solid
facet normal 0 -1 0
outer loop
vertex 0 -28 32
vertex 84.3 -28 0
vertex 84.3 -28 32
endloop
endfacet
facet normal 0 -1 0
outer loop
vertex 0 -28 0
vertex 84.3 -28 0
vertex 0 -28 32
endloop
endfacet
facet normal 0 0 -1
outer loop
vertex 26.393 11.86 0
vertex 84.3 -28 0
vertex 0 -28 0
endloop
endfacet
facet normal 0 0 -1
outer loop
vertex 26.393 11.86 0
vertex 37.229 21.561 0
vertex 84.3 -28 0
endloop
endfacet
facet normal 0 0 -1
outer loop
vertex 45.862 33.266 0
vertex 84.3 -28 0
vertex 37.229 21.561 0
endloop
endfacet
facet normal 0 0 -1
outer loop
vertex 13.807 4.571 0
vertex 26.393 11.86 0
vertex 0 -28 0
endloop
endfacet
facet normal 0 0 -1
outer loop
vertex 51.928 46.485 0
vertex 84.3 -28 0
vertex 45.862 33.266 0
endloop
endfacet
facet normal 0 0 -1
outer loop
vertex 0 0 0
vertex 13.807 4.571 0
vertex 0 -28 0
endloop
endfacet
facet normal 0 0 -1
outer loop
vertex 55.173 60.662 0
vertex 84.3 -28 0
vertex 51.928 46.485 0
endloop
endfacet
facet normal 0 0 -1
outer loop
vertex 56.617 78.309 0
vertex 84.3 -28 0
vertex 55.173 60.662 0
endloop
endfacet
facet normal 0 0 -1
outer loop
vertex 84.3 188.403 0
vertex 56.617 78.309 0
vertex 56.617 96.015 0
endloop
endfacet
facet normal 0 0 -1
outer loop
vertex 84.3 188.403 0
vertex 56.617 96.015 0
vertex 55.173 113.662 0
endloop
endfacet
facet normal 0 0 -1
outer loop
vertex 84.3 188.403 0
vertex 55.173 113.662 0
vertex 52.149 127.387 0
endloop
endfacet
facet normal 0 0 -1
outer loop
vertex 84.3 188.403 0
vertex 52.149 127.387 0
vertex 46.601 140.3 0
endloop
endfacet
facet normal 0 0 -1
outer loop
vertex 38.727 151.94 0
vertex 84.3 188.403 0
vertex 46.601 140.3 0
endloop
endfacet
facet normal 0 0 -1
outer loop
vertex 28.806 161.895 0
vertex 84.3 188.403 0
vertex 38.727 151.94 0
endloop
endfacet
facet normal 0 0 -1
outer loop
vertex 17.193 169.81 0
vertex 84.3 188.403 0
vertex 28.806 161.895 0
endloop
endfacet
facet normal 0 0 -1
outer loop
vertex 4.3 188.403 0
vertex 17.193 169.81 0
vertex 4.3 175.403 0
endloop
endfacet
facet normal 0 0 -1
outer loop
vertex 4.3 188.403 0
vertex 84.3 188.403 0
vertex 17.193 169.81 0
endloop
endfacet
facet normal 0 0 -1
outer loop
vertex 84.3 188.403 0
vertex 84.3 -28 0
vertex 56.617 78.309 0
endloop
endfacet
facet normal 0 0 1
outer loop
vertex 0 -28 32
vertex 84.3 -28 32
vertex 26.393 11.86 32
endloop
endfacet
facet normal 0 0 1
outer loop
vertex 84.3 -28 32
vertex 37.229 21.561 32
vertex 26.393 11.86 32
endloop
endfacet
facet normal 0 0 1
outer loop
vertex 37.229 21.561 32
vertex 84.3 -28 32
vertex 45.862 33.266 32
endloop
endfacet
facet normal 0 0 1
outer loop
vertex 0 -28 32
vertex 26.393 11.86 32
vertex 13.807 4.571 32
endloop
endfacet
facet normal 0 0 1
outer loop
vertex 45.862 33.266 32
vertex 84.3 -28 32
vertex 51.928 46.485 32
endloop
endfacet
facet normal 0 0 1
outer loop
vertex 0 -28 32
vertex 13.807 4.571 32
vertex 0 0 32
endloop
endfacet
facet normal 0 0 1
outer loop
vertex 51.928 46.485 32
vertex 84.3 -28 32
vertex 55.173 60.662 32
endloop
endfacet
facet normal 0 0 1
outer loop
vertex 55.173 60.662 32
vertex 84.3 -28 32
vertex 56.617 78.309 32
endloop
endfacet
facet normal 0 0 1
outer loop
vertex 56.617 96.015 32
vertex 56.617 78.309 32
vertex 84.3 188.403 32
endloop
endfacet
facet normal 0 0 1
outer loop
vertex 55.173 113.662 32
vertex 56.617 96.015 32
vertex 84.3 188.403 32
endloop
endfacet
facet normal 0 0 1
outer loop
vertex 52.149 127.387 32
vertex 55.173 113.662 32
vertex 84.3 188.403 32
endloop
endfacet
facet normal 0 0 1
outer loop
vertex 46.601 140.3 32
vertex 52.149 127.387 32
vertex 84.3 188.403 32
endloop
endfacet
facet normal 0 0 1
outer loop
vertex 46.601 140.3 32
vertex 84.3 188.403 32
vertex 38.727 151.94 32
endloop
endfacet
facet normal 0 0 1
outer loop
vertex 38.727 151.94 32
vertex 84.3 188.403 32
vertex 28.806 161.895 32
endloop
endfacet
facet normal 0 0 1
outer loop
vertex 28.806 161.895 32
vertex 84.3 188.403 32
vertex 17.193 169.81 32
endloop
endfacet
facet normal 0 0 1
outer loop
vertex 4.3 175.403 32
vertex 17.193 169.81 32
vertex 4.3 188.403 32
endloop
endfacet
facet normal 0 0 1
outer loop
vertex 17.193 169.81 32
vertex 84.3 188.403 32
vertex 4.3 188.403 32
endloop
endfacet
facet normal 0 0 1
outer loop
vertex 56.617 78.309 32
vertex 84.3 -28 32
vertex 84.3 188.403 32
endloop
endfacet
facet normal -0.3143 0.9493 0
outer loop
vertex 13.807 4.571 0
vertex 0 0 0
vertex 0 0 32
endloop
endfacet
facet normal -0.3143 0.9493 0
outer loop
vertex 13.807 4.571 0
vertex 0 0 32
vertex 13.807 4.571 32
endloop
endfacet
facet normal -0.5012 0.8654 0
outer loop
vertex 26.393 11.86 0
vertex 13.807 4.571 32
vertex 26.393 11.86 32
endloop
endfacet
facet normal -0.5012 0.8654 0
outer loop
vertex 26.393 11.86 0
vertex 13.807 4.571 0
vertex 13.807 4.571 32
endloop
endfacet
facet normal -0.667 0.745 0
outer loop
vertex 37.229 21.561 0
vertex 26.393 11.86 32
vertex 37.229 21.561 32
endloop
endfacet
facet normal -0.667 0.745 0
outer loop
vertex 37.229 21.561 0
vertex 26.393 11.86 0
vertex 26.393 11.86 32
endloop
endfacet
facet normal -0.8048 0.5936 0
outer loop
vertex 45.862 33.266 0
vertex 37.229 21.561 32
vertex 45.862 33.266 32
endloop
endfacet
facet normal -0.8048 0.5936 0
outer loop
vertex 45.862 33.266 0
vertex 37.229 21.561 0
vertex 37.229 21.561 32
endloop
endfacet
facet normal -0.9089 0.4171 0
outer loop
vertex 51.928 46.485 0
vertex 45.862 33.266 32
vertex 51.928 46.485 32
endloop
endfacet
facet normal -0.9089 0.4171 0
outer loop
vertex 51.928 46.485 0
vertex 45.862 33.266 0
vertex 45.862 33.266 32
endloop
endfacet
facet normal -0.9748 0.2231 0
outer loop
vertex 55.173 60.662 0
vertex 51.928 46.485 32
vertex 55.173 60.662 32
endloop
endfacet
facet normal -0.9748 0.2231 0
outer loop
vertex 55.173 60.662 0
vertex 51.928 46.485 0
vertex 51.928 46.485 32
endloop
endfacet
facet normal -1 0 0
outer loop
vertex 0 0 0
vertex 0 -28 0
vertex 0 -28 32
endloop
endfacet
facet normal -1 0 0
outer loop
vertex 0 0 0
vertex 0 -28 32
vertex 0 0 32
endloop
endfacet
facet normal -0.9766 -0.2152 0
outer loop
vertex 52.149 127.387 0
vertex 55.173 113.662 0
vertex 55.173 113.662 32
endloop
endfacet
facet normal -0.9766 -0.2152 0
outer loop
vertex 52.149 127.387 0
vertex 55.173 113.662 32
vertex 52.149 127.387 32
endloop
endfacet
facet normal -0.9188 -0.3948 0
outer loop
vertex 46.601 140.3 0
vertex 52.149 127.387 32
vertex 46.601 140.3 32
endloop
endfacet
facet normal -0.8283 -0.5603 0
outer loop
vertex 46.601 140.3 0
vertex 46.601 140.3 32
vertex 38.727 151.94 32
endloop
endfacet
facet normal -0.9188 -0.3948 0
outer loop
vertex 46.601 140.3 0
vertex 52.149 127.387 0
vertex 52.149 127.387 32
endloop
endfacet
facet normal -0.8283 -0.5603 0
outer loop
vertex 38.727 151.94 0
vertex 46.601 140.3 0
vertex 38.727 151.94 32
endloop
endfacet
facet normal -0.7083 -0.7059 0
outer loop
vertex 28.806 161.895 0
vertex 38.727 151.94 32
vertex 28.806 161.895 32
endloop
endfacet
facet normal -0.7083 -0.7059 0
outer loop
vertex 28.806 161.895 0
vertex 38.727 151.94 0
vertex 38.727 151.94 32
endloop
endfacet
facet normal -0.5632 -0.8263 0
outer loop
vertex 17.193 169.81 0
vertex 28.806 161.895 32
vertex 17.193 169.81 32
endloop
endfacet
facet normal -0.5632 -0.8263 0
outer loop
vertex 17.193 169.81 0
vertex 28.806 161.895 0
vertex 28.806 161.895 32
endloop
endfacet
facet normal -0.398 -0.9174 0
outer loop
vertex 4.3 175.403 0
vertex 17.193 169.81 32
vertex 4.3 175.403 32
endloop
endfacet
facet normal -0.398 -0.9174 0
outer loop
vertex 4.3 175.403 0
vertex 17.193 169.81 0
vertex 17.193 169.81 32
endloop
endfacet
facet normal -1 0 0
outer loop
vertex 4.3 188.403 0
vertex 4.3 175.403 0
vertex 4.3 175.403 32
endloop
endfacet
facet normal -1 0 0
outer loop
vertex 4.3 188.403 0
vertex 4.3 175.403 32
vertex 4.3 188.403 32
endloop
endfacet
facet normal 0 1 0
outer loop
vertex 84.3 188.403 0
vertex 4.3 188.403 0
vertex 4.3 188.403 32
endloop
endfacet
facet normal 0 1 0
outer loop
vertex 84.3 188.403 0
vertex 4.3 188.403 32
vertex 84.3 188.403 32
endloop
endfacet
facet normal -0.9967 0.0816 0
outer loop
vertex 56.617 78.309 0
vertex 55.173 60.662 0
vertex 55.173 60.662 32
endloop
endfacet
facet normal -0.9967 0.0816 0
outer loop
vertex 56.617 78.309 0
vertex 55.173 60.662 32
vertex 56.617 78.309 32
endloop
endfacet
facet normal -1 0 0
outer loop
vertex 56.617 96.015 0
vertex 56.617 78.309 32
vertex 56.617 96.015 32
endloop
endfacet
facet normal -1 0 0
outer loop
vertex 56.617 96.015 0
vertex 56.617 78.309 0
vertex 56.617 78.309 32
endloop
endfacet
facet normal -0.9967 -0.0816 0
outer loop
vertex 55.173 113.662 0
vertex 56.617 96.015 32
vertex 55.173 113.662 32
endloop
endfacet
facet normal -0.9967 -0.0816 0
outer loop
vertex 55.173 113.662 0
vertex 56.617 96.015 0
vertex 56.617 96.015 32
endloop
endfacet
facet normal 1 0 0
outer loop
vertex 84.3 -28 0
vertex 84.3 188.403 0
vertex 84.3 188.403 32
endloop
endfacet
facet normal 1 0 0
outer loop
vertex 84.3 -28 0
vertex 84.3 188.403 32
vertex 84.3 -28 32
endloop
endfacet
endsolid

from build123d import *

# Parameters (mm, degrees)
EXTRUDE_4_DEPTH = 32


with BuildPart() as part:
    # Эскиз1 → Бобышка-Вытянуть4 (new body)
    with BuildSketch(Plane.XY):
        with BuildLine():
            Line((4.299618531, 175.402841826), (4.299618531, 188.402841826))
            Line((4.299618531, 188.402841826), (84.299618531, 188.402841826))
            Line((84.299618531, 188.402841826), (84.299618531, 175.402841826))
            Line((84.299618531, 175.402841826), (84.299618531, 0))
            Line((84.299618531, 0), (84.299618531, -28))
            Line((84.299618531, -28), (0, -28))
            Line((0, -28), (0, 0))
            ThreePointArc((0, 0), (37.229295141, 21.561020186), (55.173142182, 60.662380285))
            ThreePointArc((55.173142182, 60.662380285), (56.797307883, 87.162380285), (55.173142182, 113.662380285))
            ThreePointArc((55.173142182, 113.662380285), (38.726552267, 151.940422917), (4.299618531, 175.402841826))
        make_face()
    extrude(amount=EXTRUDE_4_DEPTH)


solid = part.part
